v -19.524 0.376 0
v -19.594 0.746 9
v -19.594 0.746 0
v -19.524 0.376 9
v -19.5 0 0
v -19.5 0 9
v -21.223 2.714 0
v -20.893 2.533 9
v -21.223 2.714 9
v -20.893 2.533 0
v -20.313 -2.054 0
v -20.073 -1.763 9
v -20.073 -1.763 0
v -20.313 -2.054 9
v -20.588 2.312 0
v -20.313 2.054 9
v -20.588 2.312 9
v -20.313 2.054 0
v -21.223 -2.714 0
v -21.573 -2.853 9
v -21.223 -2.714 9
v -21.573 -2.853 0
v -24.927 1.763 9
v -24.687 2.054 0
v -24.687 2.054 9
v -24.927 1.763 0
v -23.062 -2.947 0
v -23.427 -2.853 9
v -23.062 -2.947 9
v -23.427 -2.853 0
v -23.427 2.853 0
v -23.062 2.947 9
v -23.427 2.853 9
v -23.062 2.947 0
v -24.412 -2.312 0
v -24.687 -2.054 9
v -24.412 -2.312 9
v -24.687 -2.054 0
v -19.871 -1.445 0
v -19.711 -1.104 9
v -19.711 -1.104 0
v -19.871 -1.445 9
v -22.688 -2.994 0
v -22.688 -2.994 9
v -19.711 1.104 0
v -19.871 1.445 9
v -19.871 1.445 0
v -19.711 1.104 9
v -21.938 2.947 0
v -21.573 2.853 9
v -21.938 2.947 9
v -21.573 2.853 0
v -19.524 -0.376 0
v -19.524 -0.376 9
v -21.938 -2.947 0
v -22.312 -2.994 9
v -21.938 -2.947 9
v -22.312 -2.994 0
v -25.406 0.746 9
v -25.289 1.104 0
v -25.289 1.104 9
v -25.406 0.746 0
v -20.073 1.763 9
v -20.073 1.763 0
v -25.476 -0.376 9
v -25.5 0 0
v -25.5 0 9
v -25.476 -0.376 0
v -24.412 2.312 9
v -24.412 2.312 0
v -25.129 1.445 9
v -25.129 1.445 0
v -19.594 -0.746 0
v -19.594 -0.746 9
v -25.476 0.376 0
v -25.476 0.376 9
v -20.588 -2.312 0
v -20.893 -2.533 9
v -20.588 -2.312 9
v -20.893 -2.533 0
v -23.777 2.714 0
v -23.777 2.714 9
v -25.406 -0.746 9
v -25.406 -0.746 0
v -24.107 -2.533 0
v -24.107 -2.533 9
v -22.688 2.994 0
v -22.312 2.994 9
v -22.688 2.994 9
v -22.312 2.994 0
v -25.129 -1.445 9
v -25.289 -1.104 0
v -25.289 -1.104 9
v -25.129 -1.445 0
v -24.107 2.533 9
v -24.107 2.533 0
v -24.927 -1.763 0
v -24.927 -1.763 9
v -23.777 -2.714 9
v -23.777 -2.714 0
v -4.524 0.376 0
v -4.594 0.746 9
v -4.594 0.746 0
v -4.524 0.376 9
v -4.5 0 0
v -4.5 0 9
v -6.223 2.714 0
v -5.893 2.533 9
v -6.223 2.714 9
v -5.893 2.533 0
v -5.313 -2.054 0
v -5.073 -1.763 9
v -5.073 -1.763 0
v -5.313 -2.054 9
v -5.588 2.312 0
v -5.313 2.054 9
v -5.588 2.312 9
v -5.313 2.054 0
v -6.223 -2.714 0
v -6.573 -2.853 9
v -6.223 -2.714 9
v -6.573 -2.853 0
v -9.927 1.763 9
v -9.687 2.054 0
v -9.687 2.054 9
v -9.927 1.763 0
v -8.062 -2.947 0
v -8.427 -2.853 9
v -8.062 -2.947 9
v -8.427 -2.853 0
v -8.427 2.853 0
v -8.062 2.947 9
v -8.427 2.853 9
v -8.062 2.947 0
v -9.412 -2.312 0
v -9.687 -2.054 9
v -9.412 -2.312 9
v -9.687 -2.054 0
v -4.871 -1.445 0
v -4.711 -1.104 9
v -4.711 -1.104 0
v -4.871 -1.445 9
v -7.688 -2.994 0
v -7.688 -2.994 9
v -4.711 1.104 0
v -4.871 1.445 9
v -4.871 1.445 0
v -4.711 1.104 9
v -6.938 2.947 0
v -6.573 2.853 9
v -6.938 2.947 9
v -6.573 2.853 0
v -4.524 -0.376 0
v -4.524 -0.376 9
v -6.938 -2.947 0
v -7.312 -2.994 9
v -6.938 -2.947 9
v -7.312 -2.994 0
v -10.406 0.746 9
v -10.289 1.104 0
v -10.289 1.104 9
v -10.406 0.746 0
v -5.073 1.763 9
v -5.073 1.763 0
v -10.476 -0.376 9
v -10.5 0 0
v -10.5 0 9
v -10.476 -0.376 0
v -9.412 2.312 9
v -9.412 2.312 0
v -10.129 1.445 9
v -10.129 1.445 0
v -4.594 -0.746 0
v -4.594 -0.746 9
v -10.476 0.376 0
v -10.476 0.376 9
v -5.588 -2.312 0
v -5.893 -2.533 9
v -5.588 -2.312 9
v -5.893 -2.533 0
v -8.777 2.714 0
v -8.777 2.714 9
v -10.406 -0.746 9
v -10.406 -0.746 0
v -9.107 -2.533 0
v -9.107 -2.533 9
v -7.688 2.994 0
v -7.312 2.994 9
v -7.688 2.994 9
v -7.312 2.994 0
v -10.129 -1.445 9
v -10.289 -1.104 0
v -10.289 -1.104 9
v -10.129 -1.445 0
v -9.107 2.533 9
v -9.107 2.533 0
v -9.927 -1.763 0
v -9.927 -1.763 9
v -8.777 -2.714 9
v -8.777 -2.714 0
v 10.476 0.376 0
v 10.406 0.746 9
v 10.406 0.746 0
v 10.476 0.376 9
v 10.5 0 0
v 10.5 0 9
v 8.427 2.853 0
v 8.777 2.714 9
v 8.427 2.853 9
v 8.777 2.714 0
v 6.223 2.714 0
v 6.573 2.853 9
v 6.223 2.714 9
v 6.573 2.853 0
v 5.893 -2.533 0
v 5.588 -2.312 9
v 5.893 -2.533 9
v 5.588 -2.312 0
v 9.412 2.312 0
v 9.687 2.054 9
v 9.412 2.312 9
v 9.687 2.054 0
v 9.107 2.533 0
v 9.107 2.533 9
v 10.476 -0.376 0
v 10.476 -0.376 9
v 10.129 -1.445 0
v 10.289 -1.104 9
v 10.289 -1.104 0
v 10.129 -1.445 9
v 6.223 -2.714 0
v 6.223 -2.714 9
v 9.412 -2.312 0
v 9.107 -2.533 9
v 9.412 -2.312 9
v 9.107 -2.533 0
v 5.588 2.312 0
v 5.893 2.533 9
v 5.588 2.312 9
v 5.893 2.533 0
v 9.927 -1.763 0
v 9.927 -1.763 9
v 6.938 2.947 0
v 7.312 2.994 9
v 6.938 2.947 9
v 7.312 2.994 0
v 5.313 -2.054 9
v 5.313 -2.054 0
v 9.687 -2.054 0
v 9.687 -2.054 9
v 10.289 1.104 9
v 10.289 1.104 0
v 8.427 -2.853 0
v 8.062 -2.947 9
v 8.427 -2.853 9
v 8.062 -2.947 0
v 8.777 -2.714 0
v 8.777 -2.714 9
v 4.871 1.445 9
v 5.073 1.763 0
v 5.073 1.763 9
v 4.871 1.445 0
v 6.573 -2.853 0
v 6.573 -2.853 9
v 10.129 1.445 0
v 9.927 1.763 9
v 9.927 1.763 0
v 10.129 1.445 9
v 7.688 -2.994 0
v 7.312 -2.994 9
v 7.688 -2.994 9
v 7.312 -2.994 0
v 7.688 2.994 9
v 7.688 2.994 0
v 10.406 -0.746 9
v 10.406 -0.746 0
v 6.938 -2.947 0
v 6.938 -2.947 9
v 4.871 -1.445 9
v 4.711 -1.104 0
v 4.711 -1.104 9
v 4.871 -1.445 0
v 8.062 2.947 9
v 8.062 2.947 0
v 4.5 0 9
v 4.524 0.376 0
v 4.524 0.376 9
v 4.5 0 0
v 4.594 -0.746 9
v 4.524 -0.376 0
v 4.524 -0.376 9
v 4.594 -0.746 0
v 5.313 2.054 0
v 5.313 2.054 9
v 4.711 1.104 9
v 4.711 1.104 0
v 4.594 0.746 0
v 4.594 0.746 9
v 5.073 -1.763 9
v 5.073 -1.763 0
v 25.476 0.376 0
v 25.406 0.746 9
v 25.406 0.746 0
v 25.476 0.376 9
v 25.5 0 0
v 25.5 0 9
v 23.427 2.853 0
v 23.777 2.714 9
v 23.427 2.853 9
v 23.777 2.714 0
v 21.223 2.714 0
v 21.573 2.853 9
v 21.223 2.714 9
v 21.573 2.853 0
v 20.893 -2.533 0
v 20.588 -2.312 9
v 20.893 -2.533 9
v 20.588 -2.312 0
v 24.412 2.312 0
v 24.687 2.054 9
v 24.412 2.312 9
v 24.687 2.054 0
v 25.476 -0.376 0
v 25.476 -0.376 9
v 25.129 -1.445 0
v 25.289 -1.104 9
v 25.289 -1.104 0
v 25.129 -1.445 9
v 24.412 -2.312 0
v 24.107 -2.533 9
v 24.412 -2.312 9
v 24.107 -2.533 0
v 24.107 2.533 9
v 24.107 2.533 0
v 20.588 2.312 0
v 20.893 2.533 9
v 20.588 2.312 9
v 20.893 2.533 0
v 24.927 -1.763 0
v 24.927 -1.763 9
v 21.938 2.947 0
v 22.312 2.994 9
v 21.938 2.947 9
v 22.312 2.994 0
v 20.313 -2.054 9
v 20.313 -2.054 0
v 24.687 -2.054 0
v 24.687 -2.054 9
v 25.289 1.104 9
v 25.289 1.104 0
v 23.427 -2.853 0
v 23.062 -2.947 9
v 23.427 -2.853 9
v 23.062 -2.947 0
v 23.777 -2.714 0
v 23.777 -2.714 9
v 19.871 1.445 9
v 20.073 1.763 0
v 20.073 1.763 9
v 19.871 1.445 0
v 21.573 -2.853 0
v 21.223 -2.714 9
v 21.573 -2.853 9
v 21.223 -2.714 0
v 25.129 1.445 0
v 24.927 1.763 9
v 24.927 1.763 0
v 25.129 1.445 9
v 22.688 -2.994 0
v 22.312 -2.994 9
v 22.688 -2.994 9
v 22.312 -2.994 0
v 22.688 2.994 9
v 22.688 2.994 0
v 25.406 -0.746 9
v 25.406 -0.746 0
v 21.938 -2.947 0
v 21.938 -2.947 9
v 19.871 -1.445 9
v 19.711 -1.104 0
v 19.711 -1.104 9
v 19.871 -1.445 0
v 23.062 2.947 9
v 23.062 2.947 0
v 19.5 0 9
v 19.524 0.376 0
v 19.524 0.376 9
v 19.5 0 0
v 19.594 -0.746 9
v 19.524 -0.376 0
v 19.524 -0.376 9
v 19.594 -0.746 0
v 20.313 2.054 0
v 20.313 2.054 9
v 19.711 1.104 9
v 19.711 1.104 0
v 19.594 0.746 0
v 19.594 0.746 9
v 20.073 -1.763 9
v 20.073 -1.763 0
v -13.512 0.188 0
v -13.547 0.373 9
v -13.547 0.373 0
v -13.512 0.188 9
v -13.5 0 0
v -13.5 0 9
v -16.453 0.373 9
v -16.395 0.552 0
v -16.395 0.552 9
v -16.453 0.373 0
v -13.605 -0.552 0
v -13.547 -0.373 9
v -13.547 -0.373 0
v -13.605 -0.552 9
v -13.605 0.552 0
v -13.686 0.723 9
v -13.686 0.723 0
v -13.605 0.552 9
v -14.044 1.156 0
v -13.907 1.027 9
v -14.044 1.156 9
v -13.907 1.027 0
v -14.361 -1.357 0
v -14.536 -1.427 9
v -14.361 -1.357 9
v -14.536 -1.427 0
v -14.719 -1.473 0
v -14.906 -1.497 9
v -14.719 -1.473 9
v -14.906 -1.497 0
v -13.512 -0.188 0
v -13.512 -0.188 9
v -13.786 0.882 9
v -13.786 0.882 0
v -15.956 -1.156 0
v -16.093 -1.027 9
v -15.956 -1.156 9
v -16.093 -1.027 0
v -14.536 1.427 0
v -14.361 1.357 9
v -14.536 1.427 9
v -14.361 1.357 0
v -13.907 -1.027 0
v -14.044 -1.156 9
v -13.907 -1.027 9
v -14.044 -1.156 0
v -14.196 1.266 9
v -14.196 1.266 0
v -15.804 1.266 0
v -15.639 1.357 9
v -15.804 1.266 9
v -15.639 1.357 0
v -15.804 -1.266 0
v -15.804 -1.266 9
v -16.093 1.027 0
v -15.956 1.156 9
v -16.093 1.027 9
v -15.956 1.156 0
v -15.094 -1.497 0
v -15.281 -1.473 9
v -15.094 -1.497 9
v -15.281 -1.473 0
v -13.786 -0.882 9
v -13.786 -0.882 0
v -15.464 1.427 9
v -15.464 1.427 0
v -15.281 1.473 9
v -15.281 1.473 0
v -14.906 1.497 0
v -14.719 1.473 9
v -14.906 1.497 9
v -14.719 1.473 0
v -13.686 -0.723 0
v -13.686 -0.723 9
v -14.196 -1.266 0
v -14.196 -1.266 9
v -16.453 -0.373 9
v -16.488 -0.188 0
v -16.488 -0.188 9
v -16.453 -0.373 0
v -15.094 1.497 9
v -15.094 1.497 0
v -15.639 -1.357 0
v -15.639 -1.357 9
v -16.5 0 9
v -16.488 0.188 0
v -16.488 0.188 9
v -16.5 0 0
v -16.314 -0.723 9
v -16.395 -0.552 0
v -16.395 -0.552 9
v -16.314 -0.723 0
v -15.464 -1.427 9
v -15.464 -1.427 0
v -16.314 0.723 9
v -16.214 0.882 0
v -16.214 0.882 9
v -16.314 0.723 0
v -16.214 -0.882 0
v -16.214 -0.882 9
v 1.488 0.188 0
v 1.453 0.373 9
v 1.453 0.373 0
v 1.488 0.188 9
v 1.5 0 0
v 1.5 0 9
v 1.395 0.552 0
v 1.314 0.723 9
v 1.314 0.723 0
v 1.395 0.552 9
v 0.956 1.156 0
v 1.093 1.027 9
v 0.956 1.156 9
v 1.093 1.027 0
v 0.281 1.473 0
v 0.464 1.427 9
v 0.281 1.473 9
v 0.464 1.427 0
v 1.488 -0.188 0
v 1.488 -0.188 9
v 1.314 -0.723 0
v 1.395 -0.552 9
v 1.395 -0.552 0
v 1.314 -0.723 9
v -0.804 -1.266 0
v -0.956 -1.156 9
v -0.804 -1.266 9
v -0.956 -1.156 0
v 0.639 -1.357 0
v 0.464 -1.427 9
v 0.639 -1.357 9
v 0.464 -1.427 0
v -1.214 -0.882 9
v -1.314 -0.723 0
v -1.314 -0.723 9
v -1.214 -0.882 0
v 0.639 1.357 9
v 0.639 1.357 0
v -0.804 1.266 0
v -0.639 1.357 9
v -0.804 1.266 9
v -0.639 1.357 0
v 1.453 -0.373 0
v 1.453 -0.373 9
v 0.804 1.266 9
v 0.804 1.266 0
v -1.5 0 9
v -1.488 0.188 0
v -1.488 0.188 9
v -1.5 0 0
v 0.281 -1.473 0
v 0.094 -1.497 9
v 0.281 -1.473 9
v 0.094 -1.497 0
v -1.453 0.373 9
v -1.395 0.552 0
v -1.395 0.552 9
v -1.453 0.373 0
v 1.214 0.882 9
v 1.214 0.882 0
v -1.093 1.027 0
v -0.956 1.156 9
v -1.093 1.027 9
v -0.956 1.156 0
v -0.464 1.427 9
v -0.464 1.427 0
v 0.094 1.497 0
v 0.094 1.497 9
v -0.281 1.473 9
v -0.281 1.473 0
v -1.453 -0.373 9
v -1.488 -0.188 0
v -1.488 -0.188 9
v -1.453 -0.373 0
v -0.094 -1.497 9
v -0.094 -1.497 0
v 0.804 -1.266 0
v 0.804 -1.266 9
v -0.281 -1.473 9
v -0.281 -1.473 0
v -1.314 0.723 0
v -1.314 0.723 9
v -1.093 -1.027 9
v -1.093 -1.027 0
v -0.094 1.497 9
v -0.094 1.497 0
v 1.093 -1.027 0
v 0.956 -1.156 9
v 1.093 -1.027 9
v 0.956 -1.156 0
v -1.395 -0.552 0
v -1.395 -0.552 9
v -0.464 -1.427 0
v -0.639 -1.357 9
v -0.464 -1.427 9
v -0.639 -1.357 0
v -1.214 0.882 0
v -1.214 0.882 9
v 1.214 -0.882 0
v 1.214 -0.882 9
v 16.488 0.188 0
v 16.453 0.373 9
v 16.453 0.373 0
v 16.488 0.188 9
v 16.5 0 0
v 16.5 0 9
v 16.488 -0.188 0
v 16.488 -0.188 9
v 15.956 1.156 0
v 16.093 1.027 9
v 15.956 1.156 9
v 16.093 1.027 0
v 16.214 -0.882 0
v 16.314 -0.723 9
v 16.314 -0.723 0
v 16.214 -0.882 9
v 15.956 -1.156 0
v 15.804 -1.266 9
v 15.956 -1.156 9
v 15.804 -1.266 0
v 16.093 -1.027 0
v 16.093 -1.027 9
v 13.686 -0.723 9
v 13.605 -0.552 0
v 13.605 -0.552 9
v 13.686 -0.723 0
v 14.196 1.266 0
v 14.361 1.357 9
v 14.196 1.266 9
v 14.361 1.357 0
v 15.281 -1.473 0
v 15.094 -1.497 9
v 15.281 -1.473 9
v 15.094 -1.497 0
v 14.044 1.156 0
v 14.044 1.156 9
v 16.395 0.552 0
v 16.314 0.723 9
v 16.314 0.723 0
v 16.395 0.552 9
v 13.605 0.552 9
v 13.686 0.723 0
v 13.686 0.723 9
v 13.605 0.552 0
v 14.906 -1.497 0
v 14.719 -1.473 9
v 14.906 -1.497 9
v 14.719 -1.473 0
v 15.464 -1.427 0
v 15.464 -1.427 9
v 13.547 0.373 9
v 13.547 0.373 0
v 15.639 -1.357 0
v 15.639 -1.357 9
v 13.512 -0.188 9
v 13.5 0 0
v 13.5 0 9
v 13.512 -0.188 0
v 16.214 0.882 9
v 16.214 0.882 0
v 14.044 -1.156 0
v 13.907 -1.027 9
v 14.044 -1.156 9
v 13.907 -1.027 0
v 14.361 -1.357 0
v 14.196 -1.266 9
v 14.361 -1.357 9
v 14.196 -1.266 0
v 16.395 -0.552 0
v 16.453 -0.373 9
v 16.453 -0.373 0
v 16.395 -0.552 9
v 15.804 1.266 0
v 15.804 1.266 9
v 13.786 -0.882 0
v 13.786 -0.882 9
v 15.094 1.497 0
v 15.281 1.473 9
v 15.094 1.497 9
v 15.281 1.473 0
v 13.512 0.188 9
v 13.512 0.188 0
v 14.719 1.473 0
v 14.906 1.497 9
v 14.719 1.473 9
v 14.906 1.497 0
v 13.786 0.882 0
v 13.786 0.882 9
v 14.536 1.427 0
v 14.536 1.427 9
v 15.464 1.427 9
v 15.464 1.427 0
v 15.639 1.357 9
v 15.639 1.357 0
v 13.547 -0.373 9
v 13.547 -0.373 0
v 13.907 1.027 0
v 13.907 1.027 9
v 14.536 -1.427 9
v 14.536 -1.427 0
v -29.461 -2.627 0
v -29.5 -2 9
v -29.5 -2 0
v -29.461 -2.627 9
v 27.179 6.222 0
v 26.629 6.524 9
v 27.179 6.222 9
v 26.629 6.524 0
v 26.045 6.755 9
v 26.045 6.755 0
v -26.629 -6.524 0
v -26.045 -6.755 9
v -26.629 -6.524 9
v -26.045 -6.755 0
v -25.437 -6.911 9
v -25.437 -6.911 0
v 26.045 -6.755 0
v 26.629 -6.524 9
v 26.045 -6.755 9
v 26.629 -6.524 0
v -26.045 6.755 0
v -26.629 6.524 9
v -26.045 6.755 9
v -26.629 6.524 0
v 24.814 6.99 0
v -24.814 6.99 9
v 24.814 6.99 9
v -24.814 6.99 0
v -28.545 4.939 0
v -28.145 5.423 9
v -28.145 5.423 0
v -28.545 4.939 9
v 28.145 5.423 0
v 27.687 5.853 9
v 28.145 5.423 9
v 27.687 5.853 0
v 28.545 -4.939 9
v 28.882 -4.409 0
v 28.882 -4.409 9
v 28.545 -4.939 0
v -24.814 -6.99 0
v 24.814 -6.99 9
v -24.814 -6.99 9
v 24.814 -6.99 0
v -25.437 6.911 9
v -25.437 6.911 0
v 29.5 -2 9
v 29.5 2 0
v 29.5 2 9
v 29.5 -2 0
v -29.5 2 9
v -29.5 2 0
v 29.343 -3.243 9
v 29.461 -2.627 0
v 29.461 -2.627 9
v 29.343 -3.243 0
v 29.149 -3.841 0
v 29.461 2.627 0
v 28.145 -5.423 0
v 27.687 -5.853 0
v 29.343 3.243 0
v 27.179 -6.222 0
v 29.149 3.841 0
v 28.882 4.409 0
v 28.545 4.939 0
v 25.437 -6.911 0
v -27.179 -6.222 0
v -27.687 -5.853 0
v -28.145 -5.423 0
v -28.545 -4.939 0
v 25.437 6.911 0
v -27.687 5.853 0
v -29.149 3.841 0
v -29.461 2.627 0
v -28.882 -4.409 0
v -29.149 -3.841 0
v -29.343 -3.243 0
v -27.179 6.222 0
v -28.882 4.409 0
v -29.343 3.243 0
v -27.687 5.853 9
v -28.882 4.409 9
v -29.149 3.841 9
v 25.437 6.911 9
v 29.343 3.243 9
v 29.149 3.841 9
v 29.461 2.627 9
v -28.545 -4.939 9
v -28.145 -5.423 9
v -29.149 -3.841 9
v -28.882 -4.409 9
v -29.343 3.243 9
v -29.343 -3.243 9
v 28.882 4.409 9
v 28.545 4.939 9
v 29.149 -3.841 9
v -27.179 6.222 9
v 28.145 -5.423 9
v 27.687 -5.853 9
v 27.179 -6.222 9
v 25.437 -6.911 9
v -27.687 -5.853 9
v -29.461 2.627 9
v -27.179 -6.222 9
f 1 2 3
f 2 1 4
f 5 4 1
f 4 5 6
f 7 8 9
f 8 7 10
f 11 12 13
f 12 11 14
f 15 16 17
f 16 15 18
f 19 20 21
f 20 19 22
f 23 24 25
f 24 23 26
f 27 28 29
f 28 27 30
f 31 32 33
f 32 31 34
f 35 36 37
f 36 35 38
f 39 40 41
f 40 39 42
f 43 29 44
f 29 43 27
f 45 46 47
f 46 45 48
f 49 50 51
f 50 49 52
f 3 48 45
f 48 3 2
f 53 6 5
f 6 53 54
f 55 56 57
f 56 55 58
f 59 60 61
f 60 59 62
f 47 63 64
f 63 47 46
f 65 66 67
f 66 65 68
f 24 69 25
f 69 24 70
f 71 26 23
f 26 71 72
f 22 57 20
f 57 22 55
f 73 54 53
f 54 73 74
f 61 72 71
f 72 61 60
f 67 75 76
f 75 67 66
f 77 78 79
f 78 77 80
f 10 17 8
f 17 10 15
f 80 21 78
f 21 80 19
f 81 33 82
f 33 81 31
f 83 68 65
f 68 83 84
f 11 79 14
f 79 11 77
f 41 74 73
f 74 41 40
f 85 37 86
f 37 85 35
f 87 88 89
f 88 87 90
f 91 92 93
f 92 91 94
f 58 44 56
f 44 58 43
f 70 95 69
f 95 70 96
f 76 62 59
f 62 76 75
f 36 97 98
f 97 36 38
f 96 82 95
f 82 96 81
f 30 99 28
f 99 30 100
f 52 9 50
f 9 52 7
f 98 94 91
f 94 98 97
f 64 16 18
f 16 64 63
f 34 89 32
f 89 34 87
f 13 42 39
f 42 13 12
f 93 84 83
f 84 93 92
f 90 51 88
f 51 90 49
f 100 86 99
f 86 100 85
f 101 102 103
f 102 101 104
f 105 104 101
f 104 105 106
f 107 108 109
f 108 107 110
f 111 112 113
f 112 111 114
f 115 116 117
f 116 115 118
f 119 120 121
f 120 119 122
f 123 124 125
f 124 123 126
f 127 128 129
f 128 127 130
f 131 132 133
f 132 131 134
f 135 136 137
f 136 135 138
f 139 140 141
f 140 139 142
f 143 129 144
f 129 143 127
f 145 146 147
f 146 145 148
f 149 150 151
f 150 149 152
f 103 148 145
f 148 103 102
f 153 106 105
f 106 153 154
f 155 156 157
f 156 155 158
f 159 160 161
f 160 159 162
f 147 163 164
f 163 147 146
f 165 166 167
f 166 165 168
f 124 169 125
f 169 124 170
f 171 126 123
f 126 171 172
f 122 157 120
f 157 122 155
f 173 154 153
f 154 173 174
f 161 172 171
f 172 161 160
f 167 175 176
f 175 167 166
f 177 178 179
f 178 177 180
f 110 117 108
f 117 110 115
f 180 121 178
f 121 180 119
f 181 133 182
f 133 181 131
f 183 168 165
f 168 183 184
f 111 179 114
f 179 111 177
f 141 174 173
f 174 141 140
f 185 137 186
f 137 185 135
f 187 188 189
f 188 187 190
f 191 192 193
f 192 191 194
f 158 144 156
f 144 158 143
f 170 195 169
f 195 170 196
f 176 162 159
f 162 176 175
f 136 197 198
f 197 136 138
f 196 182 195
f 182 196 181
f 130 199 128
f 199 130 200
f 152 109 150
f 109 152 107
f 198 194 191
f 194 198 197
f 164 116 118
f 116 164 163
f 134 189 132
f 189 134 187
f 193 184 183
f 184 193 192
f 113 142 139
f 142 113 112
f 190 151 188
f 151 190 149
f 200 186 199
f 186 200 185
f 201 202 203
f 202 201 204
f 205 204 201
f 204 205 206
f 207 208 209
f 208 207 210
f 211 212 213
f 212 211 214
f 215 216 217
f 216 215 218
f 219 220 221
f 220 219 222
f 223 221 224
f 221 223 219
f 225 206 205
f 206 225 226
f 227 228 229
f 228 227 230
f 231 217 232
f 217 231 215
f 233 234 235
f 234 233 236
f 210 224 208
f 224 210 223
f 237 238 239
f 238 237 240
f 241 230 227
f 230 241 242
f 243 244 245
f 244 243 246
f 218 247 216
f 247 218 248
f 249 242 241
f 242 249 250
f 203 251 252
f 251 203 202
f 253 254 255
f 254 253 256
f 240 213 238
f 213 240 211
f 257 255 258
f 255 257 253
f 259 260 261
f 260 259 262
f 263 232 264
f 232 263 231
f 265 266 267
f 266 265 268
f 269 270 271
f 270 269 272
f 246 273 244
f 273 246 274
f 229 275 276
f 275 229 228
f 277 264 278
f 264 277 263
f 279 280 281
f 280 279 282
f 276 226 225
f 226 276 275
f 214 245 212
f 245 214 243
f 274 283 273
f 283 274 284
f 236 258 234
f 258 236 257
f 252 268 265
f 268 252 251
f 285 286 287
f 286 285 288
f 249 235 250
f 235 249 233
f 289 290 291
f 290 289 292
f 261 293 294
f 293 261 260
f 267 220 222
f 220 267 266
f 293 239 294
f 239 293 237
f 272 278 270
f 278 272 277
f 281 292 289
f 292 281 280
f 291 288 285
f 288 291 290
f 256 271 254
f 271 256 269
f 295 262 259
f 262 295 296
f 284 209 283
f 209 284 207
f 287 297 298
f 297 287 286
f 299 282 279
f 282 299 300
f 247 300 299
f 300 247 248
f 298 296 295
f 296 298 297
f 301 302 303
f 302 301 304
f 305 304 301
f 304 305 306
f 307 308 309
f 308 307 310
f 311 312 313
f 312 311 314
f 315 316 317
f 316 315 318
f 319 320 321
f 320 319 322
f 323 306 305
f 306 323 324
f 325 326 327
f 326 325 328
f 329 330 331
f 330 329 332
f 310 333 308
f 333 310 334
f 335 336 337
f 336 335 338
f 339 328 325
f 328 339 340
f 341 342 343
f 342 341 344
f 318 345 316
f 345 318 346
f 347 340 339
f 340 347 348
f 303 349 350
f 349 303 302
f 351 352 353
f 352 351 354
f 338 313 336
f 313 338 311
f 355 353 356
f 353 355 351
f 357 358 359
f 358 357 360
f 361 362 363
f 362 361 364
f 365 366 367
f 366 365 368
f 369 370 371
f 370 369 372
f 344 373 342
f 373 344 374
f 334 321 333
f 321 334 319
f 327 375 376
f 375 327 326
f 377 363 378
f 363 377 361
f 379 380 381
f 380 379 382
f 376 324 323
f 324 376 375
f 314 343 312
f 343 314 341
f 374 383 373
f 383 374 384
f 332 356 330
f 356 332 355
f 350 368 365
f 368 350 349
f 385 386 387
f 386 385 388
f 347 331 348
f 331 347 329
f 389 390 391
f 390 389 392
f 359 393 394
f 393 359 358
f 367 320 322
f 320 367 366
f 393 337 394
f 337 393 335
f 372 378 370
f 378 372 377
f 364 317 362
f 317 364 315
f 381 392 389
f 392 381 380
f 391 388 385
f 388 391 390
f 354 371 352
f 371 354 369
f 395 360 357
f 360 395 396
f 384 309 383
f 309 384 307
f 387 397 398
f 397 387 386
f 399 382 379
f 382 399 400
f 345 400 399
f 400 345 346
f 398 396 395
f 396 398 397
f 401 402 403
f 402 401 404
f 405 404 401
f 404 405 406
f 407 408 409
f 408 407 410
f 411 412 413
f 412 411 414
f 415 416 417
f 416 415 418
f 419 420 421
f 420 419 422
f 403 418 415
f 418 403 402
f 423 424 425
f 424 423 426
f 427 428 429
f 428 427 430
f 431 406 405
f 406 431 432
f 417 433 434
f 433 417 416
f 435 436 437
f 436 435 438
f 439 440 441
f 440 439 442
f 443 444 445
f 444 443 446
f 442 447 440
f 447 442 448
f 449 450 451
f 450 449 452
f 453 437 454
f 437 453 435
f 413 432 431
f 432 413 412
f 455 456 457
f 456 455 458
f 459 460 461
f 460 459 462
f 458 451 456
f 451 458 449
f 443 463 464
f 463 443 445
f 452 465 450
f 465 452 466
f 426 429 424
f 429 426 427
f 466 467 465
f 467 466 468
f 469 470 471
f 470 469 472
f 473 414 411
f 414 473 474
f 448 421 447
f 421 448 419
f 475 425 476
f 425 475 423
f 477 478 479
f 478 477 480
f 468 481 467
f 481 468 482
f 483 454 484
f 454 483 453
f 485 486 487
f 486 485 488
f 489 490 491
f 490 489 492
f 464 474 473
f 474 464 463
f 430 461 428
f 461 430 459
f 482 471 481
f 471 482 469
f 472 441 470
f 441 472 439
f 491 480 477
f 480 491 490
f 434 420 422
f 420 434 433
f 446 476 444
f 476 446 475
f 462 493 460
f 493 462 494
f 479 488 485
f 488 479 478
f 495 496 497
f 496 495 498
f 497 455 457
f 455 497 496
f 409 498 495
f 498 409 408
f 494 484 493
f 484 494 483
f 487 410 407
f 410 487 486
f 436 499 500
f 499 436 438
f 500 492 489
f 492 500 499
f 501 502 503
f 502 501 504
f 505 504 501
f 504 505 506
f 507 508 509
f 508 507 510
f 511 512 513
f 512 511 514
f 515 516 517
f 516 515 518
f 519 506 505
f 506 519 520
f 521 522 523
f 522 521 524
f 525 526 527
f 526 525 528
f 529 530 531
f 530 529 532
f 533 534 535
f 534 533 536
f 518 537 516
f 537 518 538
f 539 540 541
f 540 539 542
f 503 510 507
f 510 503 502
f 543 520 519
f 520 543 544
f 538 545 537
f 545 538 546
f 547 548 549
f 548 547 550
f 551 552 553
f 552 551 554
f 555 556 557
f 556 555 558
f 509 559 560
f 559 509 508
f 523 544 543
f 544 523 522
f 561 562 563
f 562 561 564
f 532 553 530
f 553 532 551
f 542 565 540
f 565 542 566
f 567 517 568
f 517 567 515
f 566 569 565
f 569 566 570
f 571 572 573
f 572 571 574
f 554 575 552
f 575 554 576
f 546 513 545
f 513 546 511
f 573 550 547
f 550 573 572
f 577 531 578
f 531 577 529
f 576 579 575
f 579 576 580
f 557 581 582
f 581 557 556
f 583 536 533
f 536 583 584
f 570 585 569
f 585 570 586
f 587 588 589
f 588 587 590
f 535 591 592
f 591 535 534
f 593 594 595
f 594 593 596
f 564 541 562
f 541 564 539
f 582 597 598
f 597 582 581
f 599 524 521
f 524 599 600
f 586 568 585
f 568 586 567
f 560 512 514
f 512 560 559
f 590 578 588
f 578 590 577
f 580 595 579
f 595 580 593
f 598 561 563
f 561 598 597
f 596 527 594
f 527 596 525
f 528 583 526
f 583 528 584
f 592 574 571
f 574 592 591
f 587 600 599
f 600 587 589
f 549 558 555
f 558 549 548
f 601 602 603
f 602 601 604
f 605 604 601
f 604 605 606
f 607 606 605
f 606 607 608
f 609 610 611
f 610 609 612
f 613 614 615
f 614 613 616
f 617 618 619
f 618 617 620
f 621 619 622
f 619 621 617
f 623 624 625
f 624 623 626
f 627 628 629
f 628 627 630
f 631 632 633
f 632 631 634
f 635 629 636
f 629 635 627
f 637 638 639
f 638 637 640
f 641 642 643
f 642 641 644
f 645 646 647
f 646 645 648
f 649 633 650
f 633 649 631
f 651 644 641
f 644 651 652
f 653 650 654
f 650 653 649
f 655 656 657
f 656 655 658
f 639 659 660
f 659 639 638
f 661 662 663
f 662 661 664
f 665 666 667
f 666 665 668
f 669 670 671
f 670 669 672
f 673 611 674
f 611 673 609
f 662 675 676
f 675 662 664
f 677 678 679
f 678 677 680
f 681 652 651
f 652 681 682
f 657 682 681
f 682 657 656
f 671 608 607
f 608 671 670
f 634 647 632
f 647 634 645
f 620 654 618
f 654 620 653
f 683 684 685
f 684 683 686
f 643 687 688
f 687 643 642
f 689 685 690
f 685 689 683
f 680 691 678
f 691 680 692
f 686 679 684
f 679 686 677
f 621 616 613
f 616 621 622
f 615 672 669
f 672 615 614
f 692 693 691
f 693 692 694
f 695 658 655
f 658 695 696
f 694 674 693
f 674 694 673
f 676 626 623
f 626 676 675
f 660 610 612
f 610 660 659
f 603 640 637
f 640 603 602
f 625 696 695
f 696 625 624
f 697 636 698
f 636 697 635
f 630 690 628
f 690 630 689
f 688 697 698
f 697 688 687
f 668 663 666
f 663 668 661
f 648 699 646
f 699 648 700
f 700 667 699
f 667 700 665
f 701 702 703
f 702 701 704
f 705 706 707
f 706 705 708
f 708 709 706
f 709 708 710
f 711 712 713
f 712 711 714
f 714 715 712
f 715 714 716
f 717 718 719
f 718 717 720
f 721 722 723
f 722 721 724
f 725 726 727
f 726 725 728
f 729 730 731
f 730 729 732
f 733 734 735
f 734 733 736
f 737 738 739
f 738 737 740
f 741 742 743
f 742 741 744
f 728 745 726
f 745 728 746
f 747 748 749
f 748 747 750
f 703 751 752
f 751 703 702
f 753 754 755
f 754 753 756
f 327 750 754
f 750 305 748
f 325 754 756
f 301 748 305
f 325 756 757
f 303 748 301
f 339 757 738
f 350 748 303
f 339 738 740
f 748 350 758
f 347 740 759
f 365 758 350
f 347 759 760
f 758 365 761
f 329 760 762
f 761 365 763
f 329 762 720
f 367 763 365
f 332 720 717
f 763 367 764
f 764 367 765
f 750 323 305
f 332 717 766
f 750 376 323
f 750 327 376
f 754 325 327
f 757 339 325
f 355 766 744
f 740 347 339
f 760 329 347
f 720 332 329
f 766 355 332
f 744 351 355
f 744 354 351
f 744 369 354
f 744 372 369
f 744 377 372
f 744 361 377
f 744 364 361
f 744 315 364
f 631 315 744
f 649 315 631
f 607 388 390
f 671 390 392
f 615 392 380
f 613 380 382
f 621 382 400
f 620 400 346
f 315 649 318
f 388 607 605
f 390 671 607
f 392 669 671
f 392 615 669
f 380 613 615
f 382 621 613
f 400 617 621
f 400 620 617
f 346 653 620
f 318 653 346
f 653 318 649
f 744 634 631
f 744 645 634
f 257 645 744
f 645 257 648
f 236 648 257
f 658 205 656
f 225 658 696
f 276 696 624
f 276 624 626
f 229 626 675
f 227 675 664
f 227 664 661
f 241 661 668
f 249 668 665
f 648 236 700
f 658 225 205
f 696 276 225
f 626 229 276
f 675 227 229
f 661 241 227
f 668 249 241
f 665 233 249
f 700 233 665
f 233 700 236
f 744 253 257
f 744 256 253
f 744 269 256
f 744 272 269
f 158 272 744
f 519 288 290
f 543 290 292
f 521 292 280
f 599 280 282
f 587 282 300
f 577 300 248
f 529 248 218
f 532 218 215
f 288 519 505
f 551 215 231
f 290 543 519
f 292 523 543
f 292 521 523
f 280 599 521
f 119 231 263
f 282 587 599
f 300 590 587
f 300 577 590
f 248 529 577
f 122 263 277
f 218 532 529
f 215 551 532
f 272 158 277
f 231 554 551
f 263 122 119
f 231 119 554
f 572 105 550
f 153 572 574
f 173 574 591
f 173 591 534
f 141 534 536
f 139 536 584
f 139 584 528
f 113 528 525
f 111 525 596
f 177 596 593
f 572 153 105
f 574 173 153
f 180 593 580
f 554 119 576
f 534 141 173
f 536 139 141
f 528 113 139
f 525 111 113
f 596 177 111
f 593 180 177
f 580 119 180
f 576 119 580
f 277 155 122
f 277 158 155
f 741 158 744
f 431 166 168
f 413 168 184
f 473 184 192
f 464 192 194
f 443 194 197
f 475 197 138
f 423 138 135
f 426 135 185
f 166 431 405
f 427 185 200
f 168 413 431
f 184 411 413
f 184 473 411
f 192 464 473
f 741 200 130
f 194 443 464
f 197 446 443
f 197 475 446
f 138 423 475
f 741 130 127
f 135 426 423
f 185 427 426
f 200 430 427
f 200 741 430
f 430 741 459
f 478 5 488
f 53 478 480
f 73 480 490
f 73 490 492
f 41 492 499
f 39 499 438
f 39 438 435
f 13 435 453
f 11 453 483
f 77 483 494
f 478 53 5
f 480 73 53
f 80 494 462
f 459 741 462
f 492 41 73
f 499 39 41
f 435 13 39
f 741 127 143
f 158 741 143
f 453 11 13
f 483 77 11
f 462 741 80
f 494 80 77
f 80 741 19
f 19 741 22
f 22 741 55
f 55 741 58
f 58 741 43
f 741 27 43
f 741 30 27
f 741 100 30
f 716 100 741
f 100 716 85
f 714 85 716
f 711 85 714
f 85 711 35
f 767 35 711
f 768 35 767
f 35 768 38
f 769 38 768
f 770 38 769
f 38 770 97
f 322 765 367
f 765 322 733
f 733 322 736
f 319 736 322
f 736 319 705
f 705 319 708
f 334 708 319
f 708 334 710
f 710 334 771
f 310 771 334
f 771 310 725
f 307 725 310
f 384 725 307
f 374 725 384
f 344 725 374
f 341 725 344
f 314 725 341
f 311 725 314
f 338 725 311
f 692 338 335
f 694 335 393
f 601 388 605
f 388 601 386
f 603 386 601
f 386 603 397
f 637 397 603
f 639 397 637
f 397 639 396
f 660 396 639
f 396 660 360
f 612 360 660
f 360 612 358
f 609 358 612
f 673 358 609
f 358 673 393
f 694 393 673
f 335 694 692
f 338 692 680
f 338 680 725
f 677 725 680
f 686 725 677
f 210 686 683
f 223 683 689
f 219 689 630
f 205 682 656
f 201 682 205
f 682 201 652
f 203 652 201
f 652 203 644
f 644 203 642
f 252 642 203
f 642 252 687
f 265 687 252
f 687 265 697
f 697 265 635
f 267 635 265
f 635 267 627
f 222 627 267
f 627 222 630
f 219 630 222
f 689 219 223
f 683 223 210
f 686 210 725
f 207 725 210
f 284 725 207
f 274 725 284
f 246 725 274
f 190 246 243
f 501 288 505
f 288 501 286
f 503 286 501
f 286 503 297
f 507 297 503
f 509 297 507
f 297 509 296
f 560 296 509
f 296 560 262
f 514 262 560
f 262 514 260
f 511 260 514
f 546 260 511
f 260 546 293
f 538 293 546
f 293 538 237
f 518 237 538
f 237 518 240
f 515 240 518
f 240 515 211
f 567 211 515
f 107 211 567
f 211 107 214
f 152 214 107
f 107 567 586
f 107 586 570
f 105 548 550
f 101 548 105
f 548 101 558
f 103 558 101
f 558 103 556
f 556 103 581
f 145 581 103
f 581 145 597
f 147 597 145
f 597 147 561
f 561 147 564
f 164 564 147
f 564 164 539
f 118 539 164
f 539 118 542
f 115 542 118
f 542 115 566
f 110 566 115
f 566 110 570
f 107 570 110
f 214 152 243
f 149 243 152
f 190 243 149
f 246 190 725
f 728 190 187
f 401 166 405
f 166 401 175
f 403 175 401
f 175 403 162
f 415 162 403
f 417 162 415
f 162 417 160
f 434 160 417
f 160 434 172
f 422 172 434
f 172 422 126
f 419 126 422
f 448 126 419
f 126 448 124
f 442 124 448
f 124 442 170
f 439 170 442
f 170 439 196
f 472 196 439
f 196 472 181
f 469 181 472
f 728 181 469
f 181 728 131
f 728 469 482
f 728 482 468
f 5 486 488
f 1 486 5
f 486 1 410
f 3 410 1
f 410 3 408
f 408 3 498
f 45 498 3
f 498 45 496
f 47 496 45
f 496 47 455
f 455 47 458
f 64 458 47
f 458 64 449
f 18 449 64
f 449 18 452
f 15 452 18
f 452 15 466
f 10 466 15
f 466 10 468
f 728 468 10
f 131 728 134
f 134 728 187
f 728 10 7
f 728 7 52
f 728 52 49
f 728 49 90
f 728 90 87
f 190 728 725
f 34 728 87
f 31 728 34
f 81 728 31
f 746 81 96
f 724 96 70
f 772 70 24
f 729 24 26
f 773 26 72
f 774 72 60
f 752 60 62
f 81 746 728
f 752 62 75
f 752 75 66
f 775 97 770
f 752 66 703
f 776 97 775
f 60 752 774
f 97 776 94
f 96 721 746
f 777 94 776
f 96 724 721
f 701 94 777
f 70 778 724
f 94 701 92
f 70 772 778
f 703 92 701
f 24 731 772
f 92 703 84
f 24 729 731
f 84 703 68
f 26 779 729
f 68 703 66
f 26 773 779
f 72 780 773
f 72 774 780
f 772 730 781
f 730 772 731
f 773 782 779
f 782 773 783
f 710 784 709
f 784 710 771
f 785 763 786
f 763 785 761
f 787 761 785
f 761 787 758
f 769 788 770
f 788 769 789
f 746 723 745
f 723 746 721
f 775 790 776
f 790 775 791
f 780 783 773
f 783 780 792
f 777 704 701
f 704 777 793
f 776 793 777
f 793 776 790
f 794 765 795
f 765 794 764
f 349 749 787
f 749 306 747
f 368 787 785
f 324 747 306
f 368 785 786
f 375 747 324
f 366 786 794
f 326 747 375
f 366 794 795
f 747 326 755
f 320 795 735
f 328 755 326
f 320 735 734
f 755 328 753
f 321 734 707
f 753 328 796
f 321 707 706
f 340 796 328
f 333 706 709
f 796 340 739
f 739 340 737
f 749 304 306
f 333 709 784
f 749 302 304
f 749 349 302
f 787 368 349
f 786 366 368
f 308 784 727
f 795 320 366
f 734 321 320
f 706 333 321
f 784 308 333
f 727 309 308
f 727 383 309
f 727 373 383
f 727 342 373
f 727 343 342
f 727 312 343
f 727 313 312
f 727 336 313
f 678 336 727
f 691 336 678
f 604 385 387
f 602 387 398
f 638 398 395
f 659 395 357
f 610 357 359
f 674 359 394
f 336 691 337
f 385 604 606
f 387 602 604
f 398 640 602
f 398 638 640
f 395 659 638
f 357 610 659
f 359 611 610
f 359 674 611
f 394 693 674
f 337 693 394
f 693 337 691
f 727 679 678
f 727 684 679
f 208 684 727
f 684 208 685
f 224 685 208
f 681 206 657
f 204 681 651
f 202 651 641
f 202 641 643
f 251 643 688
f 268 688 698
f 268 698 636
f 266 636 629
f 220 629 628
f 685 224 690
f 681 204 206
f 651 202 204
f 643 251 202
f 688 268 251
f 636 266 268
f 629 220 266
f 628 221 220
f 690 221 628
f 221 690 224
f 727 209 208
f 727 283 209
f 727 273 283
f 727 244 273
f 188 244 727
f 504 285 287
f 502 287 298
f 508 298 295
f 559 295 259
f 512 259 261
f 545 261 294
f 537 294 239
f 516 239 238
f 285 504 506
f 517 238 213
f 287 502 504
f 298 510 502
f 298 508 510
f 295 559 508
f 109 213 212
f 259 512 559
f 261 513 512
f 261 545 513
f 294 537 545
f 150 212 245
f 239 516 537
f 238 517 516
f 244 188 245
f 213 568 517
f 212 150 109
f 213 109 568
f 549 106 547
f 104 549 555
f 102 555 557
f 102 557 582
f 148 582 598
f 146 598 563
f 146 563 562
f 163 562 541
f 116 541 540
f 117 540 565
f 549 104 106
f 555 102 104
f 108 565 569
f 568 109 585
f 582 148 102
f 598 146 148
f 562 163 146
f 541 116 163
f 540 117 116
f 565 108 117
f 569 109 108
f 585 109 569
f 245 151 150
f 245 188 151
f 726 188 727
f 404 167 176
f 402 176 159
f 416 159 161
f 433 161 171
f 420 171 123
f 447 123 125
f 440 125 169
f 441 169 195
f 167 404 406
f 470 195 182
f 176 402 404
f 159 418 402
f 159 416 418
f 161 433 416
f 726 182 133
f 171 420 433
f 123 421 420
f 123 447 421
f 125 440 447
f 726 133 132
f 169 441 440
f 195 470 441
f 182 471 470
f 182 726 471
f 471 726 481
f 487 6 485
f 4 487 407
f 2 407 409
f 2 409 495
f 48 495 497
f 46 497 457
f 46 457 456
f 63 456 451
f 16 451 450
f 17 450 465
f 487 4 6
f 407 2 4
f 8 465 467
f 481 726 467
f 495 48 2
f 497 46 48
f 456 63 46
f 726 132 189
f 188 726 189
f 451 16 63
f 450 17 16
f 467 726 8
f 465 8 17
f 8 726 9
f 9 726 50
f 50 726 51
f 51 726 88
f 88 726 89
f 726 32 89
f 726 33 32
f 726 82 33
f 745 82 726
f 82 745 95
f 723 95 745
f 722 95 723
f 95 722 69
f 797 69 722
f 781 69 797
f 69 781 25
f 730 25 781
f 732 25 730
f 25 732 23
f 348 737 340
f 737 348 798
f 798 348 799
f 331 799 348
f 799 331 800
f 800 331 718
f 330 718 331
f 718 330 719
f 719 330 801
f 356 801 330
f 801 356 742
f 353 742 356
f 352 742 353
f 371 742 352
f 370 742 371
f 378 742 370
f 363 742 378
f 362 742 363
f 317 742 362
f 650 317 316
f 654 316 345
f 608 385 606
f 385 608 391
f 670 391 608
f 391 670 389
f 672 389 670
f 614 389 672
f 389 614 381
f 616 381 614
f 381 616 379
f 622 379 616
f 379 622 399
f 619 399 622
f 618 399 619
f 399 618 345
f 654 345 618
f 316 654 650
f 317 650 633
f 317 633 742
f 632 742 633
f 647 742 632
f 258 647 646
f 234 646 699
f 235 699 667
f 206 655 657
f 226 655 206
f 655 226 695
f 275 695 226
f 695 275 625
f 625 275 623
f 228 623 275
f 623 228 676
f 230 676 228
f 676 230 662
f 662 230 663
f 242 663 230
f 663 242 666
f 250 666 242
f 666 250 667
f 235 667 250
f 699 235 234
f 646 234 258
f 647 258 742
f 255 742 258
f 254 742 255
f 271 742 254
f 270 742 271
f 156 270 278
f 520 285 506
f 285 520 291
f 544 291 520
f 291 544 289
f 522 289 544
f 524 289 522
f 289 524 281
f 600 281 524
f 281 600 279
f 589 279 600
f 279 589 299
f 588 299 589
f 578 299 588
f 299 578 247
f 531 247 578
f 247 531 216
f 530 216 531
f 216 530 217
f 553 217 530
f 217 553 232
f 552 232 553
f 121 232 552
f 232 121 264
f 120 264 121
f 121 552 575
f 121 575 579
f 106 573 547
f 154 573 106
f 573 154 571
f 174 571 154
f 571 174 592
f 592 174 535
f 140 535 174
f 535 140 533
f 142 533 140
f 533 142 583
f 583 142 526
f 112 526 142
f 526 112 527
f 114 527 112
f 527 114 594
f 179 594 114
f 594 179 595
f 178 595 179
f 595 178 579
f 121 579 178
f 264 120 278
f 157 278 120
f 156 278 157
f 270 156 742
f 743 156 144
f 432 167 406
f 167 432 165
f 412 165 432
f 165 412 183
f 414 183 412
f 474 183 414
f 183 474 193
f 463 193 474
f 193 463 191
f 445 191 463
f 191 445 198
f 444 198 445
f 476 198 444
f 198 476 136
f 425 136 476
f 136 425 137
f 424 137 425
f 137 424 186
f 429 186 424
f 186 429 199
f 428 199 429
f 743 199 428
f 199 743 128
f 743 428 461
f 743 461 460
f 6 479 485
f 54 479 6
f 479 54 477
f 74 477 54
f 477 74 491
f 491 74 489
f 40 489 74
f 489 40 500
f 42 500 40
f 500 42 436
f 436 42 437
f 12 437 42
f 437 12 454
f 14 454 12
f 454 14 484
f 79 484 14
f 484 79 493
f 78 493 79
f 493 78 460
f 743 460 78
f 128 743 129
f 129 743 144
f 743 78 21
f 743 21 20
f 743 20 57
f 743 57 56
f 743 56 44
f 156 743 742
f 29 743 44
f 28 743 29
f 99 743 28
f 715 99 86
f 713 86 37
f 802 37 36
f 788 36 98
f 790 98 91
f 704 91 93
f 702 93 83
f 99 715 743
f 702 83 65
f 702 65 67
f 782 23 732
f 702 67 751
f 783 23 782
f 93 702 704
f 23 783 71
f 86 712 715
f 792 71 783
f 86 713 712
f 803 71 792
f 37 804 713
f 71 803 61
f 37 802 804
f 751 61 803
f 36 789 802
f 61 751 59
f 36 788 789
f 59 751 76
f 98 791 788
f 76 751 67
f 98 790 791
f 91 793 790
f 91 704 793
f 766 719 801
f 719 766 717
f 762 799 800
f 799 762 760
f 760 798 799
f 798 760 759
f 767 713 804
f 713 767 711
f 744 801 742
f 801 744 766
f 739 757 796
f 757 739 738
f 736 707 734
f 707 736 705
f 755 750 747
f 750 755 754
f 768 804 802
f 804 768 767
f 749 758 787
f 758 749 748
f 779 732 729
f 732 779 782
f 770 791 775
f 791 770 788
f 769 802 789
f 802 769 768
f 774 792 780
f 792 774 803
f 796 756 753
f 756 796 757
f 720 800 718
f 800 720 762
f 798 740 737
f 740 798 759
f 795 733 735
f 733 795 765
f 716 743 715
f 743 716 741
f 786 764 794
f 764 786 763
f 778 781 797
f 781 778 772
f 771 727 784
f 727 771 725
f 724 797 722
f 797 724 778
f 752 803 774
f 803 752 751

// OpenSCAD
$fn = 50;


difference() {
	union() {
		hull() {
			translate(v = [-24.5000000000, 2.0000000000, 0]) {
				cylinder(h = 9, r = 5);
			}
			translate(v = [24.5000000000, 2.0000000000, 0]) {
				cylinder(h = 9, r = 5);
			}
			translate(v = [-24.5000000000, -2.0000000000, 0]) {
				cylinder(h = 9, r = 5);
			}
			translate(v = [24.5000000000, -2.0000000000, 0]) {
				cylinder(h = 9, r = 5);
			}
		}
	}
	union() {
		translate(v = [-22.5000000000, 0.0000000000, 0]) {
			translate(v = [0, 0, -100]) {
				cylinder(h = 200, r = 3.0000000000);
			}
		}
		translate(v = [-7.5000000000, 0.0000000000, 0]) {
			translate(v = [0, 0, -100]) {
				cylinder(h = 200, r = 3.0000000000);
			}
		}
		translate(v = [7.5000000000, 0.0000000000, 0]) {
			translate(v = [0, 0, -100]) {
				cylinder(h = 200, r = 3.0000000000);
			}
		}
		translate(v = [22.5000000000, 0.0000000000, 0]) {
			translate(v = [0, 0, -100]) {
				cylinder(h = 200, r = 3.0000000000);
			}
		}
		translate(v = [-22.5000000000, 0.0000000000, 0]) {
			translate(v = [0, 0, -100]) {
				cylinder(h = 200, r = 1.5000000000);
			}
		}
		translate(v = [-15.0000000000, 0.0000000000, 0]) {
			translate(v = [0, 0, -100]) {
				cylinder(h = 200, r = 1.5000000000);
			}
		}
		translate(v = [-7.5000000000, 0.0000000000, 0]) {
			translate(v = [0, 0, -100]) {
				cylinder(h = 200, r = 1.5000000000);
			}
		}
		translate(v = [0, 0, -100]) {
			cylinder(h = 200, r = 1.5000000000);
		}
		translate(v = [7.5000000000, 0.0000000000, 0]) {
			translate(v = [0, 0, -100]) {
				cylinder(h = 200, r = 1.5000000000);
			}
		}
		translate(v = [15.0000000000, 0.0000000000, 0]) {
			translate(v = [0, 0, -100]) {
				cylinder(h = 200, r = 1.5000000000);
			}
		}
		translate(v = [22.5000000000, 0.0000000000, 0]) {
			translate(v = [0, 0, -100]) {
				cylinder(h = 200, r = 1.5000000000);
			}
		}
	}
}
